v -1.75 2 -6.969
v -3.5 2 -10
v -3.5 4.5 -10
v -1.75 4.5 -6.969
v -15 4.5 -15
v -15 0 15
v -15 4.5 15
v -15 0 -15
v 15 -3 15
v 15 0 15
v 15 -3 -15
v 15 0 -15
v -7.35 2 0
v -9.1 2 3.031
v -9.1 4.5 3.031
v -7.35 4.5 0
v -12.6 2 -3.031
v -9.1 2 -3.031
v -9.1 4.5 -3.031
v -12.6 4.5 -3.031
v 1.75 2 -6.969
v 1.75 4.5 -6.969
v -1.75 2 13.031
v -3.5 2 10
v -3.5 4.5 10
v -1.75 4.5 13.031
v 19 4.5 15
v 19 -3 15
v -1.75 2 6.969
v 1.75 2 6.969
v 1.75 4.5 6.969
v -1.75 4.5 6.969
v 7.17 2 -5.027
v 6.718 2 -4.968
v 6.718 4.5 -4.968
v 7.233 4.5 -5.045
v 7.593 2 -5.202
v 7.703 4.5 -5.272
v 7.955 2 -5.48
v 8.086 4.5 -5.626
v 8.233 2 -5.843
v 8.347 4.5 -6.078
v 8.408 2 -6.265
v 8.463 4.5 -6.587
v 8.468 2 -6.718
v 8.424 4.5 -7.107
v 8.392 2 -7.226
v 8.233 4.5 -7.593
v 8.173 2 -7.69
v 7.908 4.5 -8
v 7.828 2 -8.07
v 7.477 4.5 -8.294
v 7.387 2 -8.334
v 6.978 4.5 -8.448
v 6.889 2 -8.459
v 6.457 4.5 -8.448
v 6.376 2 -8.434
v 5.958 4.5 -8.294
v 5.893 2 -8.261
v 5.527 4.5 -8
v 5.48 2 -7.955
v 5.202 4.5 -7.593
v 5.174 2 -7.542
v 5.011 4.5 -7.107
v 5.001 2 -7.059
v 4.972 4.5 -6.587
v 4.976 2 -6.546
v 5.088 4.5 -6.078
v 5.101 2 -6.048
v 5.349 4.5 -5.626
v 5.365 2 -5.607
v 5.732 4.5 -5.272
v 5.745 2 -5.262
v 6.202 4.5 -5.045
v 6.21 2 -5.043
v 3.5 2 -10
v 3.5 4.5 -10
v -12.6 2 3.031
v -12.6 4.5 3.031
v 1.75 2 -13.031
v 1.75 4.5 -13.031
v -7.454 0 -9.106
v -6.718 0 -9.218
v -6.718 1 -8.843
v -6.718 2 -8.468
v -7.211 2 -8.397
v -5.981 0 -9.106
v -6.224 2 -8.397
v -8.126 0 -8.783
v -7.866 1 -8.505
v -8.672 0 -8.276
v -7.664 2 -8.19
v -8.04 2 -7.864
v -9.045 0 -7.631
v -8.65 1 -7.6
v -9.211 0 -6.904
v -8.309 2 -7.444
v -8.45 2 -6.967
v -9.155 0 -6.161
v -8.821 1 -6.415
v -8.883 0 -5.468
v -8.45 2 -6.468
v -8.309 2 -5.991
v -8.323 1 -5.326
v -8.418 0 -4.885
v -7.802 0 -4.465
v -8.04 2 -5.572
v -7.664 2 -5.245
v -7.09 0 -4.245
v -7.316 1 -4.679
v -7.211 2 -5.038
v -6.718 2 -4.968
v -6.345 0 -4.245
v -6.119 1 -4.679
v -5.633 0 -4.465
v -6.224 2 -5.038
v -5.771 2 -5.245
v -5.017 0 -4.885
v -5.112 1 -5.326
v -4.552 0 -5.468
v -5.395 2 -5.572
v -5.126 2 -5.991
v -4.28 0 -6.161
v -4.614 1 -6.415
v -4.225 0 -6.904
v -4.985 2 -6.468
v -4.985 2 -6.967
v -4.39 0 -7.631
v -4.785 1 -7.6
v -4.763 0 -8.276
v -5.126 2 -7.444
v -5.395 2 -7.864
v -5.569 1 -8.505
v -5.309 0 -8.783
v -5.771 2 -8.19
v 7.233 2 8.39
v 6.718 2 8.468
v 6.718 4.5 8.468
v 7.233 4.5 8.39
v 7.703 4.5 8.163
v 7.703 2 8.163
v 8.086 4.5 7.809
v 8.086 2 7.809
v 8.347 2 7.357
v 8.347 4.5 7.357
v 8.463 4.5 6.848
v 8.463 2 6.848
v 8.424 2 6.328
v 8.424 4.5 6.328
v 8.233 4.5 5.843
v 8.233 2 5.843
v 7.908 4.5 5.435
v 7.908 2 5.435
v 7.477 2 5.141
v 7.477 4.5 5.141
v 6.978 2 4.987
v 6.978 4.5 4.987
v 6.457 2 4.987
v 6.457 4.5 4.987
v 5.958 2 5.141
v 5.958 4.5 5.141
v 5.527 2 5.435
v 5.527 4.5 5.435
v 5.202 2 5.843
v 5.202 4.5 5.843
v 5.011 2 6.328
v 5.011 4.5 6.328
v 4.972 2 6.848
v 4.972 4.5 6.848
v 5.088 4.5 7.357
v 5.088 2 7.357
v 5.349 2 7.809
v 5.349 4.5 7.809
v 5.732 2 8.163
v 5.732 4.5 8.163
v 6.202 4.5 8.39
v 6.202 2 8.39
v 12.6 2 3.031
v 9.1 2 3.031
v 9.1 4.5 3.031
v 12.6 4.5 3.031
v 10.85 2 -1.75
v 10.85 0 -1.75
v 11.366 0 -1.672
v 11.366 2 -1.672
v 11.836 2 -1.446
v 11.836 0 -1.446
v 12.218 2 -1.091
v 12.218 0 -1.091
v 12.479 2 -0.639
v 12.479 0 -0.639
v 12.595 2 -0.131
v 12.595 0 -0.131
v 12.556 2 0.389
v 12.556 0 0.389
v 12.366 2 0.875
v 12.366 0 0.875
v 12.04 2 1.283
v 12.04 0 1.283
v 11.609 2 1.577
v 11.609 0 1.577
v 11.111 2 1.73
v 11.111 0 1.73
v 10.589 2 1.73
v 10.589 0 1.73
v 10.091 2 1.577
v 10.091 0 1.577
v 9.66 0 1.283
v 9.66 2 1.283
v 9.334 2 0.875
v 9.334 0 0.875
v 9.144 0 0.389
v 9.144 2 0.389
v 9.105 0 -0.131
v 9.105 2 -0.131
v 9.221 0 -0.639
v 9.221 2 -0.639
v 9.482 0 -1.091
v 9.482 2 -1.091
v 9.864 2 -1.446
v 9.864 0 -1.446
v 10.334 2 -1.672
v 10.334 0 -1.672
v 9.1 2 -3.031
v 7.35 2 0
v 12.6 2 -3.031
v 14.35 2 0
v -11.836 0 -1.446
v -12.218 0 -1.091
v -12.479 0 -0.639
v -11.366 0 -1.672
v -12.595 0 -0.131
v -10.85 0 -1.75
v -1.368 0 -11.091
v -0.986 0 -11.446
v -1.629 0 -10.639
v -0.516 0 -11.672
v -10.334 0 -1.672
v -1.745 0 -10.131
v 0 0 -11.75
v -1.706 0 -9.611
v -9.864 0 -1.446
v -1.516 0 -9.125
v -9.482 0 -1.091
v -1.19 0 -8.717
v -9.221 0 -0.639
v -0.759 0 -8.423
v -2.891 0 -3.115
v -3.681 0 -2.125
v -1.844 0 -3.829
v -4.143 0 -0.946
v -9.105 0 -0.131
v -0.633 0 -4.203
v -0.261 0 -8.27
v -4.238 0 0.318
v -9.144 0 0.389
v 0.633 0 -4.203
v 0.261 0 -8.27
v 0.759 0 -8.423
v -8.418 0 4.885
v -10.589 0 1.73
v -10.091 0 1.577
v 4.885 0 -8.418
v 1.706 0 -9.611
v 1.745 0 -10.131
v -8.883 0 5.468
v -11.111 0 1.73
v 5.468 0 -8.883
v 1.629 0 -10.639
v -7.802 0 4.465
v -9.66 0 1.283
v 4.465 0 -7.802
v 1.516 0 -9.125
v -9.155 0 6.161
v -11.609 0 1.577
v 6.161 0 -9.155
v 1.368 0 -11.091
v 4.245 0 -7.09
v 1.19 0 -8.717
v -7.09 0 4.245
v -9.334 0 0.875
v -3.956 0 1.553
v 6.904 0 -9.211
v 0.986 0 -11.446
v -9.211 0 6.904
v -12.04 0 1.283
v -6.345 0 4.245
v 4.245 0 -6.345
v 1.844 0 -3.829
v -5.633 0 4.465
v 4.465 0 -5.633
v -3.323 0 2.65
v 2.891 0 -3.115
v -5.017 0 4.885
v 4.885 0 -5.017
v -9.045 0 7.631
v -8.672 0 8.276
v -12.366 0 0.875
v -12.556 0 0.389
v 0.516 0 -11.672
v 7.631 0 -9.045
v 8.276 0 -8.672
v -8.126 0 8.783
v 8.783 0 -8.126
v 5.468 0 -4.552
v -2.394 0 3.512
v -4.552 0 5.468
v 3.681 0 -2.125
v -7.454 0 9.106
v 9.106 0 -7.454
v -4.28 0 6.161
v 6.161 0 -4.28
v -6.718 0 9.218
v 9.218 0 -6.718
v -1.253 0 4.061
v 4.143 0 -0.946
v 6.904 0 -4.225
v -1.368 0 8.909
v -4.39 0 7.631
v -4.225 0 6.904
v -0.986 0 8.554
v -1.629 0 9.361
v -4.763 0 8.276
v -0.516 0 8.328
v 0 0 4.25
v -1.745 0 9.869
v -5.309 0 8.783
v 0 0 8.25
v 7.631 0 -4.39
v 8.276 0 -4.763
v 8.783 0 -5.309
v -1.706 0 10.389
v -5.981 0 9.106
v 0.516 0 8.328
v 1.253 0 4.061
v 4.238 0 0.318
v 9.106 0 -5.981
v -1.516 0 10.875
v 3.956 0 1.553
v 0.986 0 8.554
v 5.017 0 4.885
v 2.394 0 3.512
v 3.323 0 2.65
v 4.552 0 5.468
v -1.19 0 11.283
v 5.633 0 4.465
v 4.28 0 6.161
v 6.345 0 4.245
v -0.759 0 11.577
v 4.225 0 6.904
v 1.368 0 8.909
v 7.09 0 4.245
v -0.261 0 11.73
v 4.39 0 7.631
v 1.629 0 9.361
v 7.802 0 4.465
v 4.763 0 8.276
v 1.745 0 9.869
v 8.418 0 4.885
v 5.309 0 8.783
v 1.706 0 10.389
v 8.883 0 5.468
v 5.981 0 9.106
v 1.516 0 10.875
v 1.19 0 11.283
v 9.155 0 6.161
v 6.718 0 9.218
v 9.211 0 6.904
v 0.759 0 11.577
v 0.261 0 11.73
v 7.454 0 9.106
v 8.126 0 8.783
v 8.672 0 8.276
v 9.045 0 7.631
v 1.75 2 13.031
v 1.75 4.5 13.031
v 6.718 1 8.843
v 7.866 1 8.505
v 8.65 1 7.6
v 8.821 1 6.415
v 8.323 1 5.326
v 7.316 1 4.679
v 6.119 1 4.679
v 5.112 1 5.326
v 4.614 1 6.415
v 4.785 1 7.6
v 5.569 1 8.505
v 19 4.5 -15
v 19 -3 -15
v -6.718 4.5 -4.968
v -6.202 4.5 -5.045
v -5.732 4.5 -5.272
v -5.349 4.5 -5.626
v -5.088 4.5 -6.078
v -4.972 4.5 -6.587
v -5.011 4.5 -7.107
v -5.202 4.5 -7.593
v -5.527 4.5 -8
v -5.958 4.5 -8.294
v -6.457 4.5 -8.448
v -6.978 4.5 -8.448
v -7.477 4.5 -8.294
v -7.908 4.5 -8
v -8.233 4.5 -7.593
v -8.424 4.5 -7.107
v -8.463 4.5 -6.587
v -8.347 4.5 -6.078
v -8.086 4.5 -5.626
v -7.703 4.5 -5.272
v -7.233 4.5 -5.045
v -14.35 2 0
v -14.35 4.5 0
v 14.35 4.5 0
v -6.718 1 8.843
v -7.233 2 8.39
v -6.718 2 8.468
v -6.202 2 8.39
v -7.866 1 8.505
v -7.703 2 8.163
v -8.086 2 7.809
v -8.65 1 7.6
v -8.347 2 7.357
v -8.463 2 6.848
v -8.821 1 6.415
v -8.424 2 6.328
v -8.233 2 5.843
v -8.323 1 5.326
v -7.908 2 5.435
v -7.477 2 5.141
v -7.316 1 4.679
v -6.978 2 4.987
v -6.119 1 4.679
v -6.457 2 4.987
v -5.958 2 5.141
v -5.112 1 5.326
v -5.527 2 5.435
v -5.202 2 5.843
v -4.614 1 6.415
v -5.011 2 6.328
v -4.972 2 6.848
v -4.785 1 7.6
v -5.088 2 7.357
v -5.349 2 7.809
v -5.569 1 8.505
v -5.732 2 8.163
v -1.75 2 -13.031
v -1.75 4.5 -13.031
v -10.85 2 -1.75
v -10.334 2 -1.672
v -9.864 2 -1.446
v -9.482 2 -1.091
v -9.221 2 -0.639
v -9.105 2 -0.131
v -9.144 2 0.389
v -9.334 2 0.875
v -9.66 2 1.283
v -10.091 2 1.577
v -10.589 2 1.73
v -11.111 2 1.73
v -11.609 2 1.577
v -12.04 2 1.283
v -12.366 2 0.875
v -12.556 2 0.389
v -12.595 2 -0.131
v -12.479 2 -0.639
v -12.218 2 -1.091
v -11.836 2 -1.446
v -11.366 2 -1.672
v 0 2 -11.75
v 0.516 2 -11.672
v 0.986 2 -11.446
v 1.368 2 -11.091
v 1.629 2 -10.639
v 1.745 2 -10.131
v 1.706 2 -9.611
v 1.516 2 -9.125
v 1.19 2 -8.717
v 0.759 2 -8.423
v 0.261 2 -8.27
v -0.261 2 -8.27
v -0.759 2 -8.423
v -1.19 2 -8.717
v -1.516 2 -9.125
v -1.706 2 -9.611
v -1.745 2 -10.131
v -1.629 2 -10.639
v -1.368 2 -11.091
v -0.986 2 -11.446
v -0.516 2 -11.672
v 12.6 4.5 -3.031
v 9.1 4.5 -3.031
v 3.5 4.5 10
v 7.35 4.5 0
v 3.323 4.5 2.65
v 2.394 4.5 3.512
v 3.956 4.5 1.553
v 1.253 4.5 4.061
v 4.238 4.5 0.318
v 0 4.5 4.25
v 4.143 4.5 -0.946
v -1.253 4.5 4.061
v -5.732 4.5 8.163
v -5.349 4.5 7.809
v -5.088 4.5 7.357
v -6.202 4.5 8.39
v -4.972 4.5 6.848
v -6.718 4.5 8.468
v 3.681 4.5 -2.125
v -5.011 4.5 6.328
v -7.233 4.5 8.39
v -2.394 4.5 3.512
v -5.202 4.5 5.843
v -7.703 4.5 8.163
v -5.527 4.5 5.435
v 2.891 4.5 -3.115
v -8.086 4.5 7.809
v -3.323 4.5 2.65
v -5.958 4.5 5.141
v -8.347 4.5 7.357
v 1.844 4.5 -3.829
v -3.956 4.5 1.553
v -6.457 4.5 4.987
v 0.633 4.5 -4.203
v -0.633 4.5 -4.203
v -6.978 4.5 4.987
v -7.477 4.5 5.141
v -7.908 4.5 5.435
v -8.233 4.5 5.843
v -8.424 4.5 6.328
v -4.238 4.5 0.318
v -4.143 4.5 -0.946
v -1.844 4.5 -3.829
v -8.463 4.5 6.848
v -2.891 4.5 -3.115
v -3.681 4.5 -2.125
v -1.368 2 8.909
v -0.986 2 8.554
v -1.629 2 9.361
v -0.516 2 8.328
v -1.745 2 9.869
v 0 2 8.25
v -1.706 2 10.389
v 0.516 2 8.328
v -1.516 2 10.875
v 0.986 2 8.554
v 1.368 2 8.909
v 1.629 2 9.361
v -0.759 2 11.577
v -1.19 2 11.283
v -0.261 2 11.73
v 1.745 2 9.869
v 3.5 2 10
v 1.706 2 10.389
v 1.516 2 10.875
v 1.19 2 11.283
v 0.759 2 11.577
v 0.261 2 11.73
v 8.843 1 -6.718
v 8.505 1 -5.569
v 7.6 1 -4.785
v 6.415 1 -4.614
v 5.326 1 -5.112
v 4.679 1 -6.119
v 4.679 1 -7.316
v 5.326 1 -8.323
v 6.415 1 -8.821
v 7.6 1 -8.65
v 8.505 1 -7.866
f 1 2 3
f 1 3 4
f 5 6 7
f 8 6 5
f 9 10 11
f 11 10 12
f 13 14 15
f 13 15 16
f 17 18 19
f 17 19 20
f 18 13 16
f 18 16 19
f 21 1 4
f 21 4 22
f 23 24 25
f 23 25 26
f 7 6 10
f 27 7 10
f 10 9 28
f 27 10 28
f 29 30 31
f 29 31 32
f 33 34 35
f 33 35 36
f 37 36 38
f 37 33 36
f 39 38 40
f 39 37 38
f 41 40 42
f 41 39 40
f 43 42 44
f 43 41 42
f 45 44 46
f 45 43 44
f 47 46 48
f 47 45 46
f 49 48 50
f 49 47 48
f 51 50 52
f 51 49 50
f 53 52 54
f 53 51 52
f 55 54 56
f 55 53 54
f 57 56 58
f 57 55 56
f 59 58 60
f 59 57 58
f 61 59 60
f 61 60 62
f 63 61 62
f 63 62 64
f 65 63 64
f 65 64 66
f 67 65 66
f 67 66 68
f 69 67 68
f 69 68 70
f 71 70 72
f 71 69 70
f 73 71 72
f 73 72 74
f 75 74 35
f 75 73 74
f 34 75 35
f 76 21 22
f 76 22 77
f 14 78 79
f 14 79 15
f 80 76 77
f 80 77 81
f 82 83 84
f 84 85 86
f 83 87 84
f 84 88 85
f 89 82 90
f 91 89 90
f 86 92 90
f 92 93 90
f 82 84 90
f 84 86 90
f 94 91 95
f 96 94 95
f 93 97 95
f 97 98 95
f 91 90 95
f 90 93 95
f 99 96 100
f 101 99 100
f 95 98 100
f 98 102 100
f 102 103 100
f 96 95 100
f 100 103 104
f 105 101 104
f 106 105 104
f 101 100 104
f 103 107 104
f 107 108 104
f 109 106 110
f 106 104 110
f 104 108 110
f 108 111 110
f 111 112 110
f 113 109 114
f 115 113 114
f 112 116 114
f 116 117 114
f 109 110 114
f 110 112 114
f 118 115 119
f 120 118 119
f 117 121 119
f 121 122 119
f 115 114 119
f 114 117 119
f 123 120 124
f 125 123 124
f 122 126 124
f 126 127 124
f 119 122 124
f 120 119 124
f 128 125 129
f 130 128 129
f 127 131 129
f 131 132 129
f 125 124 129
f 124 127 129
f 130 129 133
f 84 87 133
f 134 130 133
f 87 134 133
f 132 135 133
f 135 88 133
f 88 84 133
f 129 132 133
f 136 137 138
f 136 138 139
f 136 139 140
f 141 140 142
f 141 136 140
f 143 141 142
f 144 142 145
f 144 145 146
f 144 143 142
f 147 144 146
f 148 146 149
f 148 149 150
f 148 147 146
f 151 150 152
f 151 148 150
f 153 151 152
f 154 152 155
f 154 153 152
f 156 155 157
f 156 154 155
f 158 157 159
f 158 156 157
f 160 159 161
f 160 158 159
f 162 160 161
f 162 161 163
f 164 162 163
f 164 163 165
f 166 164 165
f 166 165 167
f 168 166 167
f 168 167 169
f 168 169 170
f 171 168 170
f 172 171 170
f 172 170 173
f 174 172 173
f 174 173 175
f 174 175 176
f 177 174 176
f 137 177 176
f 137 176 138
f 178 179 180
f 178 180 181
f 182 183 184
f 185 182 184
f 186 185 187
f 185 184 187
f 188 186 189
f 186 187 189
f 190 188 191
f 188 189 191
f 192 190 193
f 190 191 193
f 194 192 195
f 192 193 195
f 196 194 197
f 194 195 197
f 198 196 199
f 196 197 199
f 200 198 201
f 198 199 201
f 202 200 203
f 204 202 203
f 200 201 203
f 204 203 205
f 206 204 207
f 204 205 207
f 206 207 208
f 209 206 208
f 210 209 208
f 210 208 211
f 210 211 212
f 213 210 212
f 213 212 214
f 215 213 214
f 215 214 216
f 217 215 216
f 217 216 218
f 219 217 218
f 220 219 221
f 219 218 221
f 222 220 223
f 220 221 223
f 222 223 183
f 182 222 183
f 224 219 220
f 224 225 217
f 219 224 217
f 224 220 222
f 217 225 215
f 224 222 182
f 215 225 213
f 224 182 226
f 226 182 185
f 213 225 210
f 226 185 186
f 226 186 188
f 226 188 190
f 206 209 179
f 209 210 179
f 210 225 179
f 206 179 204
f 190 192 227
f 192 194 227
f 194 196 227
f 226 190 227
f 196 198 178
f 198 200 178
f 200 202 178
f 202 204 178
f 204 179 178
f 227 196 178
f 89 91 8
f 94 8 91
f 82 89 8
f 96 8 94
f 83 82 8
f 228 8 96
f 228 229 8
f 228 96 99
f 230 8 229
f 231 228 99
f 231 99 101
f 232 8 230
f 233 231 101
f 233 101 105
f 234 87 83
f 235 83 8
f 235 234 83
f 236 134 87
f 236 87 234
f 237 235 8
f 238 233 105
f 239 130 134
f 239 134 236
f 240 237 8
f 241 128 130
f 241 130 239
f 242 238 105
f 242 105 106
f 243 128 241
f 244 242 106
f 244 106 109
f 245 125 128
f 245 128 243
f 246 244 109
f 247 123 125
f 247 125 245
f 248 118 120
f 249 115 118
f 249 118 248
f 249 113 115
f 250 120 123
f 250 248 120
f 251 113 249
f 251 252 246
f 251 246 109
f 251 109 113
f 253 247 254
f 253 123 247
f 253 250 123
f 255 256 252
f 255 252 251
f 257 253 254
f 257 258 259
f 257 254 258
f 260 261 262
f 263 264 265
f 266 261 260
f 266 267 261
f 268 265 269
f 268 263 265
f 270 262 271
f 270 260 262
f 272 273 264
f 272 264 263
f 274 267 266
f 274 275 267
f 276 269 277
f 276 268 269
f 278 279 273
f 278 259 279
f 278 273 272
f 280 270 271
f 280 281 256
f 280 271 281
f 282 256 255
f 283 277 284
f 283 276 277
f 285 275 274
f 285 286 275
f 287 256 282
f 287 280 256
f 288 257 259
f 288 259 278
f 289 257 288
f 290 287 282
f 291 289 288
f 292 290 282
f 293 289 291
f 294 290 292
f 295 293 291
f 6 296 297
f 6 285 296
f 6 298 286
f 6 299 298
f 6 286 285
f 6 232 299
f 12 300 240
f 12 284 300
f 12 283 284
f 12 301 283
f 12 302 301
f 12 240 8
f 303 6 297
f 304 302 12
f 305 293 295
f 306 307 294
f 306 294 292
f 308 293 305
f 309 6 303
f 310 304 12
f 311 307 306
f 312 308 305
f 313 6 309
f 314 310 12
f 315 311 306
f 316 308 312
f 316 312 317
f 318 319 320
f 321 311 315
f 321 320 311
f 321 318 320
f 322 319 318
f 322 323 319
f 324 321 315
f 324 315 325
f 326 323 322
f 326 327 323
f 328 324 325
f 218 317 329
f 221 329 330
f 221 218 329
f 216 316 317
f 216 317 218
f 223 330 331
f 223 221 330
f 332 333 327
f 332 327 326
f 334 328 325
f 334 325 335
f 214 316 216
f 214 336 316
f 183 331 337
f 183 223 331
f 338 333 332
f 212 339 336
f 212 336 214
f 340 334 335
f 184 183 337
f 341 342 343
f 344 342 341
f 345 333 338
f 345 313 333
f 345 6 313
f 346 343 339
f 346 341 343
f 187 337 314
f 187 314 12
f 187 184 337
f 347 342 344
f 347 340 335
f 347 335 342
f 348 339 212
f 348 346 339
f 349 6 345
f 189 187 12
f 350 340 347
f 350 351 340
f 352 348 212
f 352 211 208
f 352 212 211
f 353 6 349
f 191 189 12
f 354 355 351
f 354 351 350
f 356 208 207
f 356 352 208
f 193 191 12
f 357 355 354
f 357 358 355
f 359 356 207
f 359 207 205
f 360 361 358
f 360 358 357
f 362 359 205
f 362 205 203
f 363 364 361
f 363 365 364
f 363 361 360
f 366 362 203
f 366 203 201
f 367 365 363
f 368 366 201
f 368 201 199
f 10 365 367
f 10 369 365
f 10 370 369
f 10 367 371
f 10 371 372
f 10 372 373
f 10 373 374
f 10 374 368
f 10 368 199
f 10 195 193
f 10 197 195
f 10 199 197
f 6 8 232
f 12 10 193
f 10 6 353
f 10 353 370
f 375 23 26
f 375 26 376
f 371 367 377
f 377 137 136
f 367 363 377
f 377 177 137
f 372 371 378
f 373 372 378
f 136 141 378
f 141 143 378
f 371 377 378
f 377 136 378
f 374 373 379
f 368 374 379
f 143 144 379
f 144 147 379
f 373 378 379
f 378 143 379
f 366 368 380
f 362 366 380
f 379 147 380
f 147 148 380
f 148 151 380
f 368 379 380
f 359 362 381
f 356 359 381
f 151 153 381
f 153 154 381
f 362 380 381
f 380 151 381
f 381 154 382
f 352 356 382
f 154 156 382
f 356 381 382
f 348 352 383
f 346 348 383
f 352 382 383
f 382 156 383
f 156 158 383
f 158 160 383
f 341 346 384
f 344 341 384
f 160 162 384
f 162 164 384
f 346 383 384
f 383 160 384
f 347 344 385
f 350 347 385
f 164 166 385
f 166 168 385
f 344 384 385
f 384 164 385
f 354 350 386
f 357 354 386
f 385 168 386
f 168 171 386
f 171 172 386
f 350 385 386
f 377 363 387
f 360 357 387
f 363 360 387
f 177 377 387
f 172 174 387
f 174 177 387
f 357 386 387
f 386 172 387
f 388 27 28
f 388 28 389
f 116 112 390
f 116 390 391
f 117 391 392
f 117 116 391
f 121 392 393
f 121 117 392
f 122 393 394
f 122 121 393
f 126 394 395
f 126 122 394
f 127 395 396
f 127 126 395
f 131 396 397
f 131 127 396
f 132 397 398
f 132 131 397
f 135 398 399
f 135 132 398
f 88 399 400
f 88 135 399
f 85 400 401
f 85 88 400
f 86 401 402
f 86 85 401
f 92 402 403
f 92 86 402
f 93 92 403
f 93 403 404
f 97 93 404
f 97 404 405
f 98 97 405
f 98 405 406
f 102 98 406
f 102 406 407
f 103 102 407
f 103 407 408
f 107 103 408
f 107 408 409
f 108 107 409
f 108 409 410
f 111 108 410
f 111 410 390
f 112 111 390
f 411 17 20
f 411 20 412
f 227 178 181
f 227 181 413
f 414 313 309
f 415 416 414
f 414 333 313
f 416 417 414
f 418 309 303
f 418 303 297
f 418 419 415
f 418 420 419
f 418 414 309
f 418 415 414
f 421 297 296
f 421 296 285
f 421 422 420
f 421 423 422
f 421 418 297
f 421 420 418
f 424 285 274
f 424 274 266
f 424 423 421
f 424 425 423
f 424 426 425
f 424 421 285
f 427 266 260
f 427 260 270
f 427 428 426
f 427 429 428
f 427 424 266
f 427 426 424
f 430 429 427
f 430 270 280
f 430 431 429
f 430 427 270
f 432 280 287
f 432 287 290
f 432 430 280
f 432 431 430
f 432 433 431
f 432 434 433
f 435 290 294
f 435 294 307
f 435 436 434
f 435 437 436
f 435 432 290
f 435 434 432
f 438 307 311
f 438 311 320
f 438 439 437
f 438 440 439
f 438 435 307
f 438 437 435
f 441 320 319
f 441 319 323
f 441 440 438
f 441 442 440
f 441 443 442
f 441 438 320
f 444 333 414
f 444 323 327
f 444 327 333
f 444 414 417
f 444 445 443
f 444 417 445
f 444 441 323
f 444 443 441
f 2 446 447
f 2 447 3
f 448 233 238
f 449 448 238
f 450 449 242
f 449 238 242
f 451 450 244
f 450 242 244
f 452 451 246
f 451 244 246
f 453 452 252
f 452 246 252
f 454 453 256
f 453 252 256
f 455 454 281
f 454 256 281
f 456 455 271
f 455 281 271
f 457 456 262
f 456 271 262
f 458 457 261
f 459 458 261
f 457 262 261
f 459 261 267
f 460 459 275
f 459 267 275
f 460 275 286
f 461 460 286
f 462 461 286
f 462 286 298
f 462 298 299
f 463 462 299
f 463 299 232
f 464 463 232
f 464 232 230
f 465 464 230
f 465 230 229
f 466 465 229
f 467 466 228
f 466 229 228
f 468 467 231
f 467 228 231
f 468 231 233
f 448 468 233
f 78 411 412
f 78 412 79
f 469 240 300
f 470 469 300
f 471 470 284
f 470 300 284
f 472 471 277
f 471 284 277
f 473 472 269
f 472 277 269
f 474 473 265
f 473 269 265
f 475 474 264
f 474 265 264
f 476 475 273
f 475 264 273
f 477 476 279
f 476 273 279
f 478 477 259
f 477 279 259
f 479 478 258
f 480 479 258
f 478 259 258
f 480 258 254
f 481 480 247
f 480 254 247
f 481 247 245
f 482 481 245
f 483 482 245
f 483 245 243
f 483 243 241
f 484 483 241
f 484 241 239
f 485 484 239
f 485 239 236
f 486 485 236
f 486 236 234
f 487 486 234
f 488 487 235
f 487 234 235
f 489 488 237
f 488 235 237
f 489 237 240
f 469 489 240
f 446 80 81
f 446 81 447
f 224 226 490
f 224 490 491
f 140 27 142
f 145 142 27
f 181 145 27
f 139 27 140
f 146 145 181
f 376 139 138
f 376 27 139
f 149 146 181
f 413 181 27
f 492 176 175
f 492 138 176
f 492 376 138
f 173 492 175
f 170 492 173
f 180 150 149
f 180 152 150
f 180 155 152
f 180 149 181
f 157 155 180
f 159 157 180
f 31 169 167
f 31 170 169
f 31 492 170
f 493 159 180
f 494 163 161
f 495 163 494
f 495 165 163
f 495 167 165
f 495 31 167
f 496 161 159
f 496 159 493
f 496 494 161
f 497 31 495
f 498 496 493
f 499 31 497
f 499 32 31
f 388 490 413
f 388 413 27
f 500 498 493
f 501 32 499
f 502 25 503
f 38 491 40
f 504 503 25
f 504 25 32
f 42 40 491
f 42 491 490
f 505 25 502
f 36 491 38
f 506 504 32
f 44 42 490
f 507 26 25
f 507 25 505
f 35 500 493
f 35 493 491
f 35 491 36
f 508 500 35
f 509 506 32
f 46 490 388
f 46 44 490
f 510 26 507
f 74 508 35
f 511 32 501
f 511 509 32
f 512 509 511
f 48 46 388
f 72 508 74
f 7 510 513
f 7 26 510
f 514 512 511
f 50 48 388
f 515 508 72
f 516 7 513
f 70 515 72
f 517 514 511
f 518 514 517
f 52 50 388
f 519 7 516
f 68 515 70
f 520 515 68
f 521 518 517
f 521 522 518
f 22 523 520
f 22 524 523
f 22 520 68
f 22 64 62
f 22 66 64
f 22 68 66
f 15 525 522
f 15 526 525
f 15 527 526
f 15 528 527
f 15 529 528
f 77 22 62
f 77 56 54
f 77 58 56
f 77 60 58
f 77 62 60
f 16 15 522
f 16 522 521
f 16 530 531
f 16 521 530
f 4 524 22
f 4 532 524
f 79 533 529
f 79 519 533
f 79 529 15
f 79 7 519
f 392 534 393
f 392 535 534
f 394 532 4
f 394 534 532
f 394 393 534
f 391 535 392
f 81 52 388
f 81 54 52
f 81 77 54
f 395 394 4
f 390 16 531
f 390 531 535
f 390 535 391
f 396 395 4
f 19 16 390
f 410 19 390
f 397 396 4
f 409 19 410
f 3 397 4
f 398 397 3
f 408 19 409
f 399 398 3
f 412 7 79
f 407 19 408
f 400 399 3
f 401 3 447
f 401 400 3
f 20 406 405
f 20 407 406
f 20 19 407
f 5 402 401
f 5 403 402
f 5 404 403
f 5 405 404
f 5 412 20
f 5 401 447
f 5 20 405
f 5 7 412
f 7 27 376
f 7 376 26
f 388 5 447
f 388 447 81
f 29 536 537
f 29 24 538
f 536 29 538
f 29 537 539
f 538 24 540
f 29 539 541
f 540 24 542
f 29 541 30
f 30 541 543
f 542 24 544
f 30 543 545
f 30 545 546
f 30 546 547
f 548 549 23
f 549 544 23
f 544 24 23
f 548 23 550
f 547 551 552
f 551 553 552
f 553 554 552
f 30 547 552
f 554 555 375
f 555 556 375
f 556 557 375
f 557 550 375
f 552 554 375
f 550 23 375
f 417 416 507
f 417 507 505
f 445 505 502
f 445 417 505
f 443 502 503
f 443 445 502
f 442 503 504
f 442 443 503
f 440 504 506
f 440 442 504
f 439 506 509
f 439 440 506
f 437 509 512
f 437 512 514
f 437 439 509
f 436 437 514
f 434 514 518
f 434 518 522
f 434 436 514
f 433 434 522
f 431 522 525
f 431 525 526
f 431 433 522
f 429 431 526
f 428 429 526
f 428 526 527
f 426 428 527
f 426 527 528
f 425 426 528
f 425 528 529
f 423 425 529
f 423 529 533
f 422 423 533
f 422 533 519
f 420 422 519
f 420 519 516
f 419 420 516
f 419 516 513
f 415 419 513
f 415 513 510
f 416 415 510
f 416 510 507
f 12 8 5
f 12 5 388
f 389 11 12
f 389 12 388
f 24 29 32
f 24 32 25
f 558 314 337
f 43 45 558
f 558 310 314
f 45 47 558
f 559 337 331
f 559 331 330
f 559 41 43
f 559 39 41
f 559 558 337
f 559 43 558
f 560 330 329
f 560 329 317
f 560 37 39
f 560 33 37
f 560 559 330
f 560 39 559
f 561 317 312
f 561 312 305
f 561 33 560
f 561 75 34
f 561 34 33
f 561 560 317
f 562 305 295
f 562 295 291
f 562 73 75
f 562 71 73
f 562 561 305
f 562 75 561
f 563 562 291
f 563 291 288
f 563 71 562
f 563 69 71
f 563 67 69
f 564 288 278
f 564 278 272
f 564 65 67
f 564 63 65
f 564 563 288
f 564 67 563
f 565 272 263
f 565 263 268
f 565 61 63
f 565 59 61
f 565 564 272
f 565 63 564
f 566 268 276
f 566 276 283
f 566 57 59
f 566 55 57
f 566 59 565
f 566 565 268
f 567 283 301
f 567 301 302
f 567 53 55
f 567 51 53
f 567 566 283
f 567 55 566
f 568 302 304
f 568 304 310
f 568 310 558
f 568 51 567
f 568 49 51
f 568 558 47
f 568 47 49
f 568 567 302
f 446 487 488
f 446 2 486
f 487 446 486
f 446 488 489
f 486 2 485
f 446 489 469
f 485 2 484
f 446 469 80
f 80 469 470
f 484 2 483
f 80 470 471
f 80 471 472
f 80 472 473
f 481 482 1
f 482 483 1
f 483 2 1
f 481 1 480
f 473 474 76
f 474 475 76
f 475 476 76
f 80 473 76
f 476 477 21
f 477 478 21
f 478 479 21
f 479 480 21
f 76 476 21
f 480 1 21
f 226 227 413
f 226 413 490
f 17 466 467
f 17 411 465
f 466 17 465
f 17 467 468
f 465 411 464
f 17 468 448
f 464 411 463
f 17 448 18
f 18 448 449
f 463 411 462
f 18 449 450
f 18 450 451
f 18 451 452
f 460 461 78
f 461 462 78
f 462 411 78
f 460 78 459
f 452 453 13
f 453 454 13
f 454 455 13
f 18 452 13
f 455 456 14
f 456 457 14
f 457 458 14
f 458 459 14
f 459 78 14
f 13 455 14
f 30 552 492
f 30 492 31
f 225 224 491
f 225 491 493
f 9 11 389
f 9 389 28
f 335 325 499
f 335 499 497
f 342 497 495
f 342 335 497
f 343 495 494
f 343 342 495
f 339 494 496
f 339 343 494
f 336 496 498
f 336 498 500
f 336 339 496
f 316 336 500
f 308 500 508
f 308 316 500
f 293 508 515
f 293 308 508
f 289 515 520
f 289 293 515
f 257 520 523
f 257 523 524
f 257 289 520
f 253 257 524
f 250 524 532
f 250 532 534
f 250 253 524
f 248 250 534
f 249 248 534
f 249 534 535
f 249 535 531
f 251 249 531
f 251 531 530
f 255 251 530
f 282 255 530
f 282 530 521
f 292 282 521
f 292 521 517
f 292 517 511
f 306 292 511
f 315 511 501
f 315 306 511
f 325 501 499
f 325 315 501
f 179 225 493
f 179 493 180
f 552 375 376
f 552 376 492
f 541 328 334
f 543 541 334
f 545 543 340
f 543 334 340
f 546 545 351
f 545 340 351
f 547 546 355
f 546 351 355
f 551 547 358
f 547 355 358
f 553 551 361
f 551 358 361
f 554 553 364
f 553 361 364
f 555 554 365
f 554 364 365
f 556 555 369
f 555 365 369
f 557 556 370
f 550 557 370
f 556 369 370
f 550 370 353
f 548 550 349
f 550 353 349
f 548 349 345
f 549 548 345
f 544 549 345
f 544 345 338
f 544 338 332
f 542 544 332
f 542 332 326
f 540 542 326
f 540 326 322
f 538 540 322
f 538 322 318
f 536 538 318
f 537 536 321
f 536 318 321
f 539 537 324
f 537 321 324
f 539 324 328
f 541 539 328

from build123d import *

# Parameters (mm, degrees)
SCHIZZO1_W                  = 30
SCHIZZO1_H                  = 30
SCHIZZO1_R                  = 1.75
SCHIZZO1_R_2                = 4.25
PIASTRAAGGANCIO_DEPTH       = 4.5
SCHIZZO4_W                  = 58
SCHIZZO4_H                  = 39
BASEESC_DEPTH               = 4
SCHIZZO5_W                  = 8
SCHIZZO5_H                  = 4
APERTURAFASCETTA_DEPTH      = 57.455734873
SCHIZZO8_R                  = 1.75
CHIUSURAFORIESAGONALI_DEPTH = 2
RIMOZIONEPIASTAESC_DEPTH    = 10


with BuildPart() as part:
    # Schizzo1 → PiastraAggancio (new body)
    with BuildSketch(Plane(origin=(0, 0, 0), x_dir=(1, 0, 0), z_dir=(0, 1, 0))):
        Rectangle(SCHIZZO1_W, SCHIZZO1_H)
        with Locations(Location((6.717514421, -6.717514421, 0), (0, 0, 270))):
            Circle(SCHIZZO1_R, mode=Mode.SUBTRACT)
        with Locations(Location((-6.717514421, -6.717514421, 0), (0, 0, 270))):
            Circle(SCHIZZO1_R, mode=Mode.SUBTRACT)
        with Locations(Location((-6.717514421, 6.717514421, 0), (0, 0, 270))):
            Circle(SCHIZZO1_R, mode=Mode.SUBTRACT)
        with Locations(Location((6.717514421, 6.717514421, 0), (0, 0, 270))):
            Circle(SCHIZZO1_R, mode=Mode.SUBTRACT)
        with Locations(Location((0, 0, 0), (0, 0, 270))):
            Circle(SCHIZZO1_R_2, mode=Mode.SUBTRACT)
        Polygon((12.6, -3.031088913), (14.35, 0), (12.6, 3.031088913), (9.1, 3.031088913), (7.35, 0), (9.1, -3.031088913), align=None, mode=Mode.SUBTRACT)
        Polygon((-3.5, -10), (-1.75, -13.031088913), (1.75, -13.031088913), (3.5, -10), (1.75, -6.968911087), (-1.75, -6.968911087), align=None, mode=Mode.SUBTRACT)
        Polygon((-14.35, 0), (-12.6, -3.031088913), (-9.1, -3.031088913), (-7.35, 0), (-9.1, 3.031088913), (-12.6, 3.031088913), align=None, mode=Mode.SUBTRACT)
        Polygon((1.75, 6.968911087), (3.5, 10), (1.75, 13.031088913), (-1.75, 13.031088913), (-3.5, 10), (-1.75, 6.968911087), align=None, mode=Mode.SUBTRACT)
    extrude(amount=PIASTRAAGGANCIO_DEPTH)

    # Schizzo4 → BaseESC (add)
    with BuildSketch(Plane(origin=(15, 0, 0), x_dir=(0, 0, -1), z_dir=(1, 0, 0))):
        with Locations((0, -15)):
            Rectangle(SCHIZZO4_W, SCHIZZO4_H)
    extrude(amount=BASEESC_DEPTH)

    # Schizzo5 → AperturaFascetta (cut, through all)
    with BuildSketch(Plane(origin=(19, 0, 0), x_dir=(0, 0, -1), z_dir=(1, 0, 0))):
        with Locations((-21, -0.5)):
            Rectangle(SCHIZZO5_W, SCHIZZO5_H)
        with Locations((21, -0.5)):
            Rectangle(SCHIZZO5_W, SCHIZZO5_H)
        with Locations((21, -29.5)):
            Rectangle(SCHIZZO5_W, SCHIZZO5_H)
        with Locations((-21, -29.5)):
            Rectangle(SCHIZZO5_W, SCHIZZO5_H)
    extrude(amount=-APERTURAFASCETTA_DEPTH, mode=Mode.SUBTRACT)

    # Schizzo7 → SvasaturaVitiInferiori (revolve, cut)
    with BuildSketch(Plane.XY.offset(6.717514421), mode=Mode.PRIVATE) as svasaturavitiinferiori_sk:
        Polygon((-9.217514421, 0), (-8.467514421, 2), (-6.717514421, 2), (-6.717514421, 0), align=None)
    svasaturavitiinferiori = revolve(svasaturavitiinferiori_sk.sketch.rotate(Axis((-6.717514421, 2, 6.717514421), (0, -1, 0)), 270), axis=Axis((-6.717514421, 2, 6.717514421), (0, -1, 0)), mode=Mode.SUBTRACT)

    # SvasaturaVitiInferiori2: SvasaturaVitiInferiori across plane
    add(svasaturavitiinferiori.mirror(Plane(origin=(0, 0, 0), x_dir=(0, 0, 1), z_dir=(1, 0, 0))), mode=Mode.SUBTRACT)

    # SvasaturaVitiInferiori3: SvasaturaVitiInferiori across plane
    add(svasaturavitiinferiori.mirror(Plane.XY), mode=Mode.SUBTRACT)

    # SvasaturaVitiInferiori3 copy 1 sketch → SvasaturaVitiInferiori3 copy 1 (revolve, cut)
    with BuildSketch(Plane(origin=(0, 0, -6.717514421), x_dir=(-1, 0, 0), z_dir=(0, 0, -1))):
        Polygon((-9.217514421, 0), (-8.467514421, 2), (-6.717514421, 2), (-6.717514421, 0), align=None)
    revolve(axis=Axis((6.717514421, 2, -6.717514421), (0, -1, 0)), mode=Mode.SUBTRACT)

    # Schizzo8 → ChiusuraForiEsagonali (add)
    # profile 1 of 4: a face of its own
    with BuildSketch(Plane.XZ):
        Polygon((1.75, -13.031088913), (3.5, -10), (1.75, -6.968911087), (-1.75, -6.968911087), (-3.5, -10), (-1.75, -13.031088913), align=None)
        with Locations(Location((0, -10, 0), (0, 0, 270))):
            Circle(SCHIZZO8_R, mode=Mode.SUBTRACT)
    # profile 2 of 4: a face of its own
    with BuildSketch(Plane.XZ):
        Polygon((12.6, 3.031088913), (9.1, 3.031088913), (7.35, 0), (9.1, -3.031088913), (12.6, -3.031088913), (14.35, 0), align=None)
        with Locations(Location((10.85, 0, 0), (0, 0, 270))):
            Circle(SCHIZZO8_R, mode=Mode.SUBTRACT)
    # profile 3 of 4: a face of its own
    with BuildSketch(Plane.XZ):
        Polygon((-1.75, 13.031088913), (-3.5, 10), (-1.75, 6.968911087), (1.75, 6.968911087), (3.5, 10), (1.75, 13.031088913), align=None)
        with Locations(Location((0, 10, 0), (0, 0, 270))):
            Circle(SCHIZZO8_R, mode=Mode.SUBTRACT)
    # profile 4 of 4: a face of its own
    with BuildSketch(Plane.XZ):
        Polygon((-14.35, 0), (-12.6, -3.031088913), (-9.1, -3.031088913), (-7.35, 0), (-9.1, 3.031088913), (-12.6, 3.031088913), align=None)
        with Locations(Location((-10.85, 0, 0), (0, 0, 270))):
            Circle(SCHIZZO8_R, mode=Mode.SUBTRACT)
    extrude(amount=-CHIUSURAFORIESAGONALI_DEPTH)

    # Schizzo9 → RimozionePiastaESC (cut)
    with BuildSketch(Plane.ZY.offset(-15)):
        Polygon((-15, 0), (-15, -3), (15, -3), (15, 0), (15, 4.5), (29, 4.5), (29, -34.5), (-29, -34.5), (-29, 4.5), (-15, 4.5), align=None)
    extrude(amount=-RIMOZIONEPIASTAESC_DEPTH, mode=Mode.SUBTRACT)


solid = part.part
